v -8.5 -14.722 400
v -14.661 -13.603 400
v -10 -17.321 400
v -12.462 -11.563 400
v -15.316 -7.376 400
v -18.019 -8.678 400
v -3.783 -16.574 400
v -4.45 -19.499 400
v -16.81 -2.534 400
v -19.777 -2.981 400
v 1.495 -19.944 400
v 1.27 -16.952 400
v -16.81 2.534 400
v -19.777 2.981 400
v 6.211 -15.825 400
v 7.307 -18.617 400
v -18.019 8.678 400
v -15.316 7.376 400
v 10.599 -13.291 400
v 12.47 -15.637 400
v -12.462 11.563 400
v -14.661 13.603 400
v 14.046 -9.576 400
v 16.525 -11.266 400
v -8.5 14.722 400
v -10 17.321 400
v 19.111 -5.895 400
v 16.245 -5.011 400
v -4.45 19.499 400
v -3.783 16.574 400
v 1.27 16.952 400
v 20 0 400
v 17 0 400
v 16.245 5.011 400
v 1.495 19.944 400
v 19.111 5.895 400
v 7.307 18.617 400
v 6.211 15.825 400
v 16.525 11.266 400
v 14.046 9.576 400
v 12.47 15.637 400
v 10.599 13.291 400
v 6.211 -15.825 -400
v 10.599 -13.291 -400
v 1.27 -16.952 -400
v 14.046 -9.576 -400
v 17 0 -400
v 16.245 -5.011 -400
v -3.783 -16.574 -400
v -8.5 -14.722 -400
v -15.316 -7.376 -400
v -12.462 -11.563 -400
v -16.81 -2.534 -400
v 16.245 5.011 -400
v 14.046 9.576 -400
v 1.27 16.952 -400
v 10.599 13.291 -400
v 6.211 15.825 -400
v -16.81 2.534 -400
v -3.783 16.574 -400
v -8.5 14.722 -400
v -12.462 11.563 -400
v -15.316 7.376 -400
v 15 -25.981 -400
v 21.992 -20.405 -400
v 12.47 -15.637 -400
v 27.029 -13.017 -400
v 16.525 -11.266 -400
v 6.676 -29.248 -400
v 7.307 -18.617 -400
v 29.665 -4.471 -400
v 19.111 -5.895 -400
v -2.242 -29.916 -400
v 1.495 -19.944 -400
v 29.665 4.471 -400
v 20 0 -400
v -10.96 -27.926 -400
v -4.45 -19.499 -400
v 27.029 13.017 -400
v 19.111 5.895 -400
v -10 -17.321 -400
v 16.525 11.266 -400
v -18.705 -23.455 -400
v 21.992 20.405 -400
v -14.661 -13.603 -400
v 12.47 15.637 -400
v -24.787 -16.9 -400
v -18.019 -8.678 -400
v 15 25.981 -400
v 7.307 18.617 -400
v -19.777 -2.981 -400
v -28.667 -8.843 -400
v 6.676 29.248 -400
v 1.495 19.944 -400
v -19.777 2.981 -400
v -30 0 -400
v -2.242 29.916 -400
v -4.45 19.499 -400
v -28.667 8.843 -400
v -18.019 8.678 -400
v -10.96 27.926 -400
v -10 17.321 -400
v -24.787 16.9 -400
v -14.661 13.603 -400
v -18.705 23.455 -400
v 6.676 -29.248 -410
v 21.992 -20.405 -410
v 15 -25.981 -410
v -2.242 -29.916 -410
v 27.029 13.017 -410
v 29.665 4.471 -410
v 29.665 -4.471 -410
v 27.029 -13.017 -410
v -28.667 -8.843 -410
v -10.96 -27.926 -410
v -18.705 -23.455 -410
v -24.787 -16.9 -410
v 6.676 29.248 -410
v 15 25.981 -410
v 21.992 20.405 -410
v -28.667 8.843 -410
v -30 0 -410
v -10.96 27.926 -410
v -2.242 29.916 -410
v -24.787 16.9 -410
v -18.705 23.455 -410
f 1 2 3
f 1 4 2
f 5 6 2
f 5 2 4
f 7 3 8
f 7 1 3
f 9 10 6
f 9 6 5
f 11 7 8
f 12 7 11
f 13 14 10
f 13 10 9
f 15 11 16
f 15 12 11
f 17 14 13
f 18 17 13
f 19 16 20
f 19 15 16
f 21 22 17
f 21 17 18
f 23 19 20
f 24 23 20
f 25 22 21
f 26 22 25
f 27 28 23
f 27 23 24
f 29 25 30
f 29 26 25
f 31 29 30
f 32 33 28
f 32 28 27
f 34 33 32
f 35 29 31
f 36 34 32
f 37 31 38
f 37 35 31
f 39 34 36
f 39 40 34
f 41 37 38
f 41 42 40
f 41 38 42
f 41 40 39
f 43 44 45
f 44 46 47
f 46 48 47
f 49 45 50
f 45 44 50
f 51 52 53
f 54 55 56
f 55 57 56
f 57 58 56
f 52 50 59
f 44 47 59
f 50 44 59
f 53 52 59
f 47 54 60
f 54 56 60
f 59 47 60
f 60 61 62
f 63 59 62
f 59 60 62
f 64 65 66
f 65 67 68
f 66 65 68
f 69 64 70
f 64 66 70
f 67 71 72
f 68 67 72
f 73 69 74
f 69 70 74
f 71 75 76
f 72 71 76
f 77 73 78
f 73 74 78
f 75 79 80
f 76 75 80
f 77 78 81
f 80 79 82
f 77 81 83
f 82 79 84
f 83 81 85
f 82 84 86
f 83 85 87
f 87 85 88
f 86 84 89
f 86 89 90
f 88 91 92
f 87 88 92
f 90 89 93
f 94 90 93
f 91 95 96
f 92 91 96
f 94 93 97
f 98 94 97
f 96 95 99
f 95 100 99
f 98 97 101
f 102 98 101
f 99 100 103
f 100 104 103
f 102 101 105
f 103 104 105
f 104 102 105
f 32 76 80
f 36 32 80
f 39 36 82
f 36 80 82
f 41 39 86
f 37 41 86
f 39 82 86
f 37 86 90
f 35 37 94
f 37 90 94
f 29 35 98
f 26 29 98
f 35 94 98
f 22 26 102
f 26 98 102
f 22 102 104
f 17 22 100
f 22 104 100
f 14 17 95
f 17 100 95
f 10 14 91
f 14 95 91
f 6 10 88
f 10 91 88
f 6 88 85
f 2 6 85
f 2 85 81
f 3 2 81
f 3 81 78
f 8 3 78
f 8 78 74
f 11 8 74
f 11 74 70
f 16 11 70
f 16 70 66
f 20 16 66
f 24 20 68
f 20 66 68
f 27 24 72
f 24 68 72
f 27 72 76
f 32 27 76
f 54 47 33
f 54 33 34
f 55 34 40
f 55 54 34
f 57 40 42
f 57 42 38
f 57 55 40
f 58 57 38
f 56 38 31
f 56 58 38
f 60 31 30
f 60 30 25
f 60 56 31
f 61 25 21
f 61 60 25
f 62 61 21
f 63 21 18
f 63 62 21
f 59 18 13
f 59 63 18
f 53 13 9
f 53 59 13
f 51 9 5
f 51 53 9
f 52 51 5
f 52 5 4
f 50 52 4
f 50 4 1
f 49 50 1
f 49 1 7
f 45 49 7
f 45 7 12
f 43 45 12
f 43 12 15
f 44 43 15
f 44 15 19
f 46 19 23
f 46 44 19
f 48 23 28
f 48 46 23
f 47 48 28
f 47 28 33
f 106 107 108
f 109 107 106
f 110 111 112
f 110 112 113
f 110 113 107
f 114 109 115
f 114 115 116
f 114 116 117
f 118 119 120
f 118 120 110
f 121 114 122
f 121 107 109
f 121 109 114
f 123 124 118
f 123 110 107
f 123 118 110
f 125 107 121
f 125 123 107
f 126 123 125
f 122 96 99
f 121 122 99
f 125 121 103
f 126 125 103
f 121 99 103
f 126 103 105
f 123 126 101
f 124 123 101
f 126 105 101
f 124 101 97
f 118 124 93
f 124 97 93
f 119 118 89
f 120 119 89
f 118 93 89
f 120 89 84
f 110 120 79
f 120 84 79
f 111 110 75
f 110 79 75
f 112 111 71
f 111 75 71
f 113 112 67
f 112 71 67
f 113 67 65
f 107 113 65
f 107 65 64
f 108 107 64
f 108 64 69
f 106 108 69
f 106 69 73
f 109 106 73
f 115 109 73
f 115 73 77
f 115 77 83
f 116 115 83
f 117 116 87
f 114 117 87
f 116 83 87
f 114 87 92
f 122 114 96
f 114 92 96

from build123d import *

# Parameters (mm, degrees)
BOSS_EXTRUDE1_DEPTH      = 400
BOSS_EXTRUDE1_DEPTH_BACK = 400
SKETCH3_R                = 20
SKETCH3_R_2              = 17
SKETCH7_R                = 30
BOSS_EXTRUDE4_DEPTH      = 10


with BuildPart() as part:
    # Sketch3 → Boss-Extrude1 (new, two sides: drawn at the far end of the back side and taken through both)
    with BuildSketch(Plane.XY.offset(-BOSS_EXTRUDE1_DEPTH_BACK)):
        Circle(SKETCH3_R)
        Circle(SKETCH3_R_2, mode=Mode.SUBTRACT)
    extrude(amount=BOSS_EXTRUDE1_DEPTH + BOSS_EXTRUDE1_DEPTH_BACK)

    # Sketch7 → Boss-Extrude4 (add)
    with BuildSketch(Plane(origin=(0, 0, -400), x_dir=(-1, 0, 0), z_dir=(0, 0, -1))):
        Circle(SKETCH7_R)
    extrude(amount=BOSS_EXTRUDE4_DEPTH)


solid = part.part
